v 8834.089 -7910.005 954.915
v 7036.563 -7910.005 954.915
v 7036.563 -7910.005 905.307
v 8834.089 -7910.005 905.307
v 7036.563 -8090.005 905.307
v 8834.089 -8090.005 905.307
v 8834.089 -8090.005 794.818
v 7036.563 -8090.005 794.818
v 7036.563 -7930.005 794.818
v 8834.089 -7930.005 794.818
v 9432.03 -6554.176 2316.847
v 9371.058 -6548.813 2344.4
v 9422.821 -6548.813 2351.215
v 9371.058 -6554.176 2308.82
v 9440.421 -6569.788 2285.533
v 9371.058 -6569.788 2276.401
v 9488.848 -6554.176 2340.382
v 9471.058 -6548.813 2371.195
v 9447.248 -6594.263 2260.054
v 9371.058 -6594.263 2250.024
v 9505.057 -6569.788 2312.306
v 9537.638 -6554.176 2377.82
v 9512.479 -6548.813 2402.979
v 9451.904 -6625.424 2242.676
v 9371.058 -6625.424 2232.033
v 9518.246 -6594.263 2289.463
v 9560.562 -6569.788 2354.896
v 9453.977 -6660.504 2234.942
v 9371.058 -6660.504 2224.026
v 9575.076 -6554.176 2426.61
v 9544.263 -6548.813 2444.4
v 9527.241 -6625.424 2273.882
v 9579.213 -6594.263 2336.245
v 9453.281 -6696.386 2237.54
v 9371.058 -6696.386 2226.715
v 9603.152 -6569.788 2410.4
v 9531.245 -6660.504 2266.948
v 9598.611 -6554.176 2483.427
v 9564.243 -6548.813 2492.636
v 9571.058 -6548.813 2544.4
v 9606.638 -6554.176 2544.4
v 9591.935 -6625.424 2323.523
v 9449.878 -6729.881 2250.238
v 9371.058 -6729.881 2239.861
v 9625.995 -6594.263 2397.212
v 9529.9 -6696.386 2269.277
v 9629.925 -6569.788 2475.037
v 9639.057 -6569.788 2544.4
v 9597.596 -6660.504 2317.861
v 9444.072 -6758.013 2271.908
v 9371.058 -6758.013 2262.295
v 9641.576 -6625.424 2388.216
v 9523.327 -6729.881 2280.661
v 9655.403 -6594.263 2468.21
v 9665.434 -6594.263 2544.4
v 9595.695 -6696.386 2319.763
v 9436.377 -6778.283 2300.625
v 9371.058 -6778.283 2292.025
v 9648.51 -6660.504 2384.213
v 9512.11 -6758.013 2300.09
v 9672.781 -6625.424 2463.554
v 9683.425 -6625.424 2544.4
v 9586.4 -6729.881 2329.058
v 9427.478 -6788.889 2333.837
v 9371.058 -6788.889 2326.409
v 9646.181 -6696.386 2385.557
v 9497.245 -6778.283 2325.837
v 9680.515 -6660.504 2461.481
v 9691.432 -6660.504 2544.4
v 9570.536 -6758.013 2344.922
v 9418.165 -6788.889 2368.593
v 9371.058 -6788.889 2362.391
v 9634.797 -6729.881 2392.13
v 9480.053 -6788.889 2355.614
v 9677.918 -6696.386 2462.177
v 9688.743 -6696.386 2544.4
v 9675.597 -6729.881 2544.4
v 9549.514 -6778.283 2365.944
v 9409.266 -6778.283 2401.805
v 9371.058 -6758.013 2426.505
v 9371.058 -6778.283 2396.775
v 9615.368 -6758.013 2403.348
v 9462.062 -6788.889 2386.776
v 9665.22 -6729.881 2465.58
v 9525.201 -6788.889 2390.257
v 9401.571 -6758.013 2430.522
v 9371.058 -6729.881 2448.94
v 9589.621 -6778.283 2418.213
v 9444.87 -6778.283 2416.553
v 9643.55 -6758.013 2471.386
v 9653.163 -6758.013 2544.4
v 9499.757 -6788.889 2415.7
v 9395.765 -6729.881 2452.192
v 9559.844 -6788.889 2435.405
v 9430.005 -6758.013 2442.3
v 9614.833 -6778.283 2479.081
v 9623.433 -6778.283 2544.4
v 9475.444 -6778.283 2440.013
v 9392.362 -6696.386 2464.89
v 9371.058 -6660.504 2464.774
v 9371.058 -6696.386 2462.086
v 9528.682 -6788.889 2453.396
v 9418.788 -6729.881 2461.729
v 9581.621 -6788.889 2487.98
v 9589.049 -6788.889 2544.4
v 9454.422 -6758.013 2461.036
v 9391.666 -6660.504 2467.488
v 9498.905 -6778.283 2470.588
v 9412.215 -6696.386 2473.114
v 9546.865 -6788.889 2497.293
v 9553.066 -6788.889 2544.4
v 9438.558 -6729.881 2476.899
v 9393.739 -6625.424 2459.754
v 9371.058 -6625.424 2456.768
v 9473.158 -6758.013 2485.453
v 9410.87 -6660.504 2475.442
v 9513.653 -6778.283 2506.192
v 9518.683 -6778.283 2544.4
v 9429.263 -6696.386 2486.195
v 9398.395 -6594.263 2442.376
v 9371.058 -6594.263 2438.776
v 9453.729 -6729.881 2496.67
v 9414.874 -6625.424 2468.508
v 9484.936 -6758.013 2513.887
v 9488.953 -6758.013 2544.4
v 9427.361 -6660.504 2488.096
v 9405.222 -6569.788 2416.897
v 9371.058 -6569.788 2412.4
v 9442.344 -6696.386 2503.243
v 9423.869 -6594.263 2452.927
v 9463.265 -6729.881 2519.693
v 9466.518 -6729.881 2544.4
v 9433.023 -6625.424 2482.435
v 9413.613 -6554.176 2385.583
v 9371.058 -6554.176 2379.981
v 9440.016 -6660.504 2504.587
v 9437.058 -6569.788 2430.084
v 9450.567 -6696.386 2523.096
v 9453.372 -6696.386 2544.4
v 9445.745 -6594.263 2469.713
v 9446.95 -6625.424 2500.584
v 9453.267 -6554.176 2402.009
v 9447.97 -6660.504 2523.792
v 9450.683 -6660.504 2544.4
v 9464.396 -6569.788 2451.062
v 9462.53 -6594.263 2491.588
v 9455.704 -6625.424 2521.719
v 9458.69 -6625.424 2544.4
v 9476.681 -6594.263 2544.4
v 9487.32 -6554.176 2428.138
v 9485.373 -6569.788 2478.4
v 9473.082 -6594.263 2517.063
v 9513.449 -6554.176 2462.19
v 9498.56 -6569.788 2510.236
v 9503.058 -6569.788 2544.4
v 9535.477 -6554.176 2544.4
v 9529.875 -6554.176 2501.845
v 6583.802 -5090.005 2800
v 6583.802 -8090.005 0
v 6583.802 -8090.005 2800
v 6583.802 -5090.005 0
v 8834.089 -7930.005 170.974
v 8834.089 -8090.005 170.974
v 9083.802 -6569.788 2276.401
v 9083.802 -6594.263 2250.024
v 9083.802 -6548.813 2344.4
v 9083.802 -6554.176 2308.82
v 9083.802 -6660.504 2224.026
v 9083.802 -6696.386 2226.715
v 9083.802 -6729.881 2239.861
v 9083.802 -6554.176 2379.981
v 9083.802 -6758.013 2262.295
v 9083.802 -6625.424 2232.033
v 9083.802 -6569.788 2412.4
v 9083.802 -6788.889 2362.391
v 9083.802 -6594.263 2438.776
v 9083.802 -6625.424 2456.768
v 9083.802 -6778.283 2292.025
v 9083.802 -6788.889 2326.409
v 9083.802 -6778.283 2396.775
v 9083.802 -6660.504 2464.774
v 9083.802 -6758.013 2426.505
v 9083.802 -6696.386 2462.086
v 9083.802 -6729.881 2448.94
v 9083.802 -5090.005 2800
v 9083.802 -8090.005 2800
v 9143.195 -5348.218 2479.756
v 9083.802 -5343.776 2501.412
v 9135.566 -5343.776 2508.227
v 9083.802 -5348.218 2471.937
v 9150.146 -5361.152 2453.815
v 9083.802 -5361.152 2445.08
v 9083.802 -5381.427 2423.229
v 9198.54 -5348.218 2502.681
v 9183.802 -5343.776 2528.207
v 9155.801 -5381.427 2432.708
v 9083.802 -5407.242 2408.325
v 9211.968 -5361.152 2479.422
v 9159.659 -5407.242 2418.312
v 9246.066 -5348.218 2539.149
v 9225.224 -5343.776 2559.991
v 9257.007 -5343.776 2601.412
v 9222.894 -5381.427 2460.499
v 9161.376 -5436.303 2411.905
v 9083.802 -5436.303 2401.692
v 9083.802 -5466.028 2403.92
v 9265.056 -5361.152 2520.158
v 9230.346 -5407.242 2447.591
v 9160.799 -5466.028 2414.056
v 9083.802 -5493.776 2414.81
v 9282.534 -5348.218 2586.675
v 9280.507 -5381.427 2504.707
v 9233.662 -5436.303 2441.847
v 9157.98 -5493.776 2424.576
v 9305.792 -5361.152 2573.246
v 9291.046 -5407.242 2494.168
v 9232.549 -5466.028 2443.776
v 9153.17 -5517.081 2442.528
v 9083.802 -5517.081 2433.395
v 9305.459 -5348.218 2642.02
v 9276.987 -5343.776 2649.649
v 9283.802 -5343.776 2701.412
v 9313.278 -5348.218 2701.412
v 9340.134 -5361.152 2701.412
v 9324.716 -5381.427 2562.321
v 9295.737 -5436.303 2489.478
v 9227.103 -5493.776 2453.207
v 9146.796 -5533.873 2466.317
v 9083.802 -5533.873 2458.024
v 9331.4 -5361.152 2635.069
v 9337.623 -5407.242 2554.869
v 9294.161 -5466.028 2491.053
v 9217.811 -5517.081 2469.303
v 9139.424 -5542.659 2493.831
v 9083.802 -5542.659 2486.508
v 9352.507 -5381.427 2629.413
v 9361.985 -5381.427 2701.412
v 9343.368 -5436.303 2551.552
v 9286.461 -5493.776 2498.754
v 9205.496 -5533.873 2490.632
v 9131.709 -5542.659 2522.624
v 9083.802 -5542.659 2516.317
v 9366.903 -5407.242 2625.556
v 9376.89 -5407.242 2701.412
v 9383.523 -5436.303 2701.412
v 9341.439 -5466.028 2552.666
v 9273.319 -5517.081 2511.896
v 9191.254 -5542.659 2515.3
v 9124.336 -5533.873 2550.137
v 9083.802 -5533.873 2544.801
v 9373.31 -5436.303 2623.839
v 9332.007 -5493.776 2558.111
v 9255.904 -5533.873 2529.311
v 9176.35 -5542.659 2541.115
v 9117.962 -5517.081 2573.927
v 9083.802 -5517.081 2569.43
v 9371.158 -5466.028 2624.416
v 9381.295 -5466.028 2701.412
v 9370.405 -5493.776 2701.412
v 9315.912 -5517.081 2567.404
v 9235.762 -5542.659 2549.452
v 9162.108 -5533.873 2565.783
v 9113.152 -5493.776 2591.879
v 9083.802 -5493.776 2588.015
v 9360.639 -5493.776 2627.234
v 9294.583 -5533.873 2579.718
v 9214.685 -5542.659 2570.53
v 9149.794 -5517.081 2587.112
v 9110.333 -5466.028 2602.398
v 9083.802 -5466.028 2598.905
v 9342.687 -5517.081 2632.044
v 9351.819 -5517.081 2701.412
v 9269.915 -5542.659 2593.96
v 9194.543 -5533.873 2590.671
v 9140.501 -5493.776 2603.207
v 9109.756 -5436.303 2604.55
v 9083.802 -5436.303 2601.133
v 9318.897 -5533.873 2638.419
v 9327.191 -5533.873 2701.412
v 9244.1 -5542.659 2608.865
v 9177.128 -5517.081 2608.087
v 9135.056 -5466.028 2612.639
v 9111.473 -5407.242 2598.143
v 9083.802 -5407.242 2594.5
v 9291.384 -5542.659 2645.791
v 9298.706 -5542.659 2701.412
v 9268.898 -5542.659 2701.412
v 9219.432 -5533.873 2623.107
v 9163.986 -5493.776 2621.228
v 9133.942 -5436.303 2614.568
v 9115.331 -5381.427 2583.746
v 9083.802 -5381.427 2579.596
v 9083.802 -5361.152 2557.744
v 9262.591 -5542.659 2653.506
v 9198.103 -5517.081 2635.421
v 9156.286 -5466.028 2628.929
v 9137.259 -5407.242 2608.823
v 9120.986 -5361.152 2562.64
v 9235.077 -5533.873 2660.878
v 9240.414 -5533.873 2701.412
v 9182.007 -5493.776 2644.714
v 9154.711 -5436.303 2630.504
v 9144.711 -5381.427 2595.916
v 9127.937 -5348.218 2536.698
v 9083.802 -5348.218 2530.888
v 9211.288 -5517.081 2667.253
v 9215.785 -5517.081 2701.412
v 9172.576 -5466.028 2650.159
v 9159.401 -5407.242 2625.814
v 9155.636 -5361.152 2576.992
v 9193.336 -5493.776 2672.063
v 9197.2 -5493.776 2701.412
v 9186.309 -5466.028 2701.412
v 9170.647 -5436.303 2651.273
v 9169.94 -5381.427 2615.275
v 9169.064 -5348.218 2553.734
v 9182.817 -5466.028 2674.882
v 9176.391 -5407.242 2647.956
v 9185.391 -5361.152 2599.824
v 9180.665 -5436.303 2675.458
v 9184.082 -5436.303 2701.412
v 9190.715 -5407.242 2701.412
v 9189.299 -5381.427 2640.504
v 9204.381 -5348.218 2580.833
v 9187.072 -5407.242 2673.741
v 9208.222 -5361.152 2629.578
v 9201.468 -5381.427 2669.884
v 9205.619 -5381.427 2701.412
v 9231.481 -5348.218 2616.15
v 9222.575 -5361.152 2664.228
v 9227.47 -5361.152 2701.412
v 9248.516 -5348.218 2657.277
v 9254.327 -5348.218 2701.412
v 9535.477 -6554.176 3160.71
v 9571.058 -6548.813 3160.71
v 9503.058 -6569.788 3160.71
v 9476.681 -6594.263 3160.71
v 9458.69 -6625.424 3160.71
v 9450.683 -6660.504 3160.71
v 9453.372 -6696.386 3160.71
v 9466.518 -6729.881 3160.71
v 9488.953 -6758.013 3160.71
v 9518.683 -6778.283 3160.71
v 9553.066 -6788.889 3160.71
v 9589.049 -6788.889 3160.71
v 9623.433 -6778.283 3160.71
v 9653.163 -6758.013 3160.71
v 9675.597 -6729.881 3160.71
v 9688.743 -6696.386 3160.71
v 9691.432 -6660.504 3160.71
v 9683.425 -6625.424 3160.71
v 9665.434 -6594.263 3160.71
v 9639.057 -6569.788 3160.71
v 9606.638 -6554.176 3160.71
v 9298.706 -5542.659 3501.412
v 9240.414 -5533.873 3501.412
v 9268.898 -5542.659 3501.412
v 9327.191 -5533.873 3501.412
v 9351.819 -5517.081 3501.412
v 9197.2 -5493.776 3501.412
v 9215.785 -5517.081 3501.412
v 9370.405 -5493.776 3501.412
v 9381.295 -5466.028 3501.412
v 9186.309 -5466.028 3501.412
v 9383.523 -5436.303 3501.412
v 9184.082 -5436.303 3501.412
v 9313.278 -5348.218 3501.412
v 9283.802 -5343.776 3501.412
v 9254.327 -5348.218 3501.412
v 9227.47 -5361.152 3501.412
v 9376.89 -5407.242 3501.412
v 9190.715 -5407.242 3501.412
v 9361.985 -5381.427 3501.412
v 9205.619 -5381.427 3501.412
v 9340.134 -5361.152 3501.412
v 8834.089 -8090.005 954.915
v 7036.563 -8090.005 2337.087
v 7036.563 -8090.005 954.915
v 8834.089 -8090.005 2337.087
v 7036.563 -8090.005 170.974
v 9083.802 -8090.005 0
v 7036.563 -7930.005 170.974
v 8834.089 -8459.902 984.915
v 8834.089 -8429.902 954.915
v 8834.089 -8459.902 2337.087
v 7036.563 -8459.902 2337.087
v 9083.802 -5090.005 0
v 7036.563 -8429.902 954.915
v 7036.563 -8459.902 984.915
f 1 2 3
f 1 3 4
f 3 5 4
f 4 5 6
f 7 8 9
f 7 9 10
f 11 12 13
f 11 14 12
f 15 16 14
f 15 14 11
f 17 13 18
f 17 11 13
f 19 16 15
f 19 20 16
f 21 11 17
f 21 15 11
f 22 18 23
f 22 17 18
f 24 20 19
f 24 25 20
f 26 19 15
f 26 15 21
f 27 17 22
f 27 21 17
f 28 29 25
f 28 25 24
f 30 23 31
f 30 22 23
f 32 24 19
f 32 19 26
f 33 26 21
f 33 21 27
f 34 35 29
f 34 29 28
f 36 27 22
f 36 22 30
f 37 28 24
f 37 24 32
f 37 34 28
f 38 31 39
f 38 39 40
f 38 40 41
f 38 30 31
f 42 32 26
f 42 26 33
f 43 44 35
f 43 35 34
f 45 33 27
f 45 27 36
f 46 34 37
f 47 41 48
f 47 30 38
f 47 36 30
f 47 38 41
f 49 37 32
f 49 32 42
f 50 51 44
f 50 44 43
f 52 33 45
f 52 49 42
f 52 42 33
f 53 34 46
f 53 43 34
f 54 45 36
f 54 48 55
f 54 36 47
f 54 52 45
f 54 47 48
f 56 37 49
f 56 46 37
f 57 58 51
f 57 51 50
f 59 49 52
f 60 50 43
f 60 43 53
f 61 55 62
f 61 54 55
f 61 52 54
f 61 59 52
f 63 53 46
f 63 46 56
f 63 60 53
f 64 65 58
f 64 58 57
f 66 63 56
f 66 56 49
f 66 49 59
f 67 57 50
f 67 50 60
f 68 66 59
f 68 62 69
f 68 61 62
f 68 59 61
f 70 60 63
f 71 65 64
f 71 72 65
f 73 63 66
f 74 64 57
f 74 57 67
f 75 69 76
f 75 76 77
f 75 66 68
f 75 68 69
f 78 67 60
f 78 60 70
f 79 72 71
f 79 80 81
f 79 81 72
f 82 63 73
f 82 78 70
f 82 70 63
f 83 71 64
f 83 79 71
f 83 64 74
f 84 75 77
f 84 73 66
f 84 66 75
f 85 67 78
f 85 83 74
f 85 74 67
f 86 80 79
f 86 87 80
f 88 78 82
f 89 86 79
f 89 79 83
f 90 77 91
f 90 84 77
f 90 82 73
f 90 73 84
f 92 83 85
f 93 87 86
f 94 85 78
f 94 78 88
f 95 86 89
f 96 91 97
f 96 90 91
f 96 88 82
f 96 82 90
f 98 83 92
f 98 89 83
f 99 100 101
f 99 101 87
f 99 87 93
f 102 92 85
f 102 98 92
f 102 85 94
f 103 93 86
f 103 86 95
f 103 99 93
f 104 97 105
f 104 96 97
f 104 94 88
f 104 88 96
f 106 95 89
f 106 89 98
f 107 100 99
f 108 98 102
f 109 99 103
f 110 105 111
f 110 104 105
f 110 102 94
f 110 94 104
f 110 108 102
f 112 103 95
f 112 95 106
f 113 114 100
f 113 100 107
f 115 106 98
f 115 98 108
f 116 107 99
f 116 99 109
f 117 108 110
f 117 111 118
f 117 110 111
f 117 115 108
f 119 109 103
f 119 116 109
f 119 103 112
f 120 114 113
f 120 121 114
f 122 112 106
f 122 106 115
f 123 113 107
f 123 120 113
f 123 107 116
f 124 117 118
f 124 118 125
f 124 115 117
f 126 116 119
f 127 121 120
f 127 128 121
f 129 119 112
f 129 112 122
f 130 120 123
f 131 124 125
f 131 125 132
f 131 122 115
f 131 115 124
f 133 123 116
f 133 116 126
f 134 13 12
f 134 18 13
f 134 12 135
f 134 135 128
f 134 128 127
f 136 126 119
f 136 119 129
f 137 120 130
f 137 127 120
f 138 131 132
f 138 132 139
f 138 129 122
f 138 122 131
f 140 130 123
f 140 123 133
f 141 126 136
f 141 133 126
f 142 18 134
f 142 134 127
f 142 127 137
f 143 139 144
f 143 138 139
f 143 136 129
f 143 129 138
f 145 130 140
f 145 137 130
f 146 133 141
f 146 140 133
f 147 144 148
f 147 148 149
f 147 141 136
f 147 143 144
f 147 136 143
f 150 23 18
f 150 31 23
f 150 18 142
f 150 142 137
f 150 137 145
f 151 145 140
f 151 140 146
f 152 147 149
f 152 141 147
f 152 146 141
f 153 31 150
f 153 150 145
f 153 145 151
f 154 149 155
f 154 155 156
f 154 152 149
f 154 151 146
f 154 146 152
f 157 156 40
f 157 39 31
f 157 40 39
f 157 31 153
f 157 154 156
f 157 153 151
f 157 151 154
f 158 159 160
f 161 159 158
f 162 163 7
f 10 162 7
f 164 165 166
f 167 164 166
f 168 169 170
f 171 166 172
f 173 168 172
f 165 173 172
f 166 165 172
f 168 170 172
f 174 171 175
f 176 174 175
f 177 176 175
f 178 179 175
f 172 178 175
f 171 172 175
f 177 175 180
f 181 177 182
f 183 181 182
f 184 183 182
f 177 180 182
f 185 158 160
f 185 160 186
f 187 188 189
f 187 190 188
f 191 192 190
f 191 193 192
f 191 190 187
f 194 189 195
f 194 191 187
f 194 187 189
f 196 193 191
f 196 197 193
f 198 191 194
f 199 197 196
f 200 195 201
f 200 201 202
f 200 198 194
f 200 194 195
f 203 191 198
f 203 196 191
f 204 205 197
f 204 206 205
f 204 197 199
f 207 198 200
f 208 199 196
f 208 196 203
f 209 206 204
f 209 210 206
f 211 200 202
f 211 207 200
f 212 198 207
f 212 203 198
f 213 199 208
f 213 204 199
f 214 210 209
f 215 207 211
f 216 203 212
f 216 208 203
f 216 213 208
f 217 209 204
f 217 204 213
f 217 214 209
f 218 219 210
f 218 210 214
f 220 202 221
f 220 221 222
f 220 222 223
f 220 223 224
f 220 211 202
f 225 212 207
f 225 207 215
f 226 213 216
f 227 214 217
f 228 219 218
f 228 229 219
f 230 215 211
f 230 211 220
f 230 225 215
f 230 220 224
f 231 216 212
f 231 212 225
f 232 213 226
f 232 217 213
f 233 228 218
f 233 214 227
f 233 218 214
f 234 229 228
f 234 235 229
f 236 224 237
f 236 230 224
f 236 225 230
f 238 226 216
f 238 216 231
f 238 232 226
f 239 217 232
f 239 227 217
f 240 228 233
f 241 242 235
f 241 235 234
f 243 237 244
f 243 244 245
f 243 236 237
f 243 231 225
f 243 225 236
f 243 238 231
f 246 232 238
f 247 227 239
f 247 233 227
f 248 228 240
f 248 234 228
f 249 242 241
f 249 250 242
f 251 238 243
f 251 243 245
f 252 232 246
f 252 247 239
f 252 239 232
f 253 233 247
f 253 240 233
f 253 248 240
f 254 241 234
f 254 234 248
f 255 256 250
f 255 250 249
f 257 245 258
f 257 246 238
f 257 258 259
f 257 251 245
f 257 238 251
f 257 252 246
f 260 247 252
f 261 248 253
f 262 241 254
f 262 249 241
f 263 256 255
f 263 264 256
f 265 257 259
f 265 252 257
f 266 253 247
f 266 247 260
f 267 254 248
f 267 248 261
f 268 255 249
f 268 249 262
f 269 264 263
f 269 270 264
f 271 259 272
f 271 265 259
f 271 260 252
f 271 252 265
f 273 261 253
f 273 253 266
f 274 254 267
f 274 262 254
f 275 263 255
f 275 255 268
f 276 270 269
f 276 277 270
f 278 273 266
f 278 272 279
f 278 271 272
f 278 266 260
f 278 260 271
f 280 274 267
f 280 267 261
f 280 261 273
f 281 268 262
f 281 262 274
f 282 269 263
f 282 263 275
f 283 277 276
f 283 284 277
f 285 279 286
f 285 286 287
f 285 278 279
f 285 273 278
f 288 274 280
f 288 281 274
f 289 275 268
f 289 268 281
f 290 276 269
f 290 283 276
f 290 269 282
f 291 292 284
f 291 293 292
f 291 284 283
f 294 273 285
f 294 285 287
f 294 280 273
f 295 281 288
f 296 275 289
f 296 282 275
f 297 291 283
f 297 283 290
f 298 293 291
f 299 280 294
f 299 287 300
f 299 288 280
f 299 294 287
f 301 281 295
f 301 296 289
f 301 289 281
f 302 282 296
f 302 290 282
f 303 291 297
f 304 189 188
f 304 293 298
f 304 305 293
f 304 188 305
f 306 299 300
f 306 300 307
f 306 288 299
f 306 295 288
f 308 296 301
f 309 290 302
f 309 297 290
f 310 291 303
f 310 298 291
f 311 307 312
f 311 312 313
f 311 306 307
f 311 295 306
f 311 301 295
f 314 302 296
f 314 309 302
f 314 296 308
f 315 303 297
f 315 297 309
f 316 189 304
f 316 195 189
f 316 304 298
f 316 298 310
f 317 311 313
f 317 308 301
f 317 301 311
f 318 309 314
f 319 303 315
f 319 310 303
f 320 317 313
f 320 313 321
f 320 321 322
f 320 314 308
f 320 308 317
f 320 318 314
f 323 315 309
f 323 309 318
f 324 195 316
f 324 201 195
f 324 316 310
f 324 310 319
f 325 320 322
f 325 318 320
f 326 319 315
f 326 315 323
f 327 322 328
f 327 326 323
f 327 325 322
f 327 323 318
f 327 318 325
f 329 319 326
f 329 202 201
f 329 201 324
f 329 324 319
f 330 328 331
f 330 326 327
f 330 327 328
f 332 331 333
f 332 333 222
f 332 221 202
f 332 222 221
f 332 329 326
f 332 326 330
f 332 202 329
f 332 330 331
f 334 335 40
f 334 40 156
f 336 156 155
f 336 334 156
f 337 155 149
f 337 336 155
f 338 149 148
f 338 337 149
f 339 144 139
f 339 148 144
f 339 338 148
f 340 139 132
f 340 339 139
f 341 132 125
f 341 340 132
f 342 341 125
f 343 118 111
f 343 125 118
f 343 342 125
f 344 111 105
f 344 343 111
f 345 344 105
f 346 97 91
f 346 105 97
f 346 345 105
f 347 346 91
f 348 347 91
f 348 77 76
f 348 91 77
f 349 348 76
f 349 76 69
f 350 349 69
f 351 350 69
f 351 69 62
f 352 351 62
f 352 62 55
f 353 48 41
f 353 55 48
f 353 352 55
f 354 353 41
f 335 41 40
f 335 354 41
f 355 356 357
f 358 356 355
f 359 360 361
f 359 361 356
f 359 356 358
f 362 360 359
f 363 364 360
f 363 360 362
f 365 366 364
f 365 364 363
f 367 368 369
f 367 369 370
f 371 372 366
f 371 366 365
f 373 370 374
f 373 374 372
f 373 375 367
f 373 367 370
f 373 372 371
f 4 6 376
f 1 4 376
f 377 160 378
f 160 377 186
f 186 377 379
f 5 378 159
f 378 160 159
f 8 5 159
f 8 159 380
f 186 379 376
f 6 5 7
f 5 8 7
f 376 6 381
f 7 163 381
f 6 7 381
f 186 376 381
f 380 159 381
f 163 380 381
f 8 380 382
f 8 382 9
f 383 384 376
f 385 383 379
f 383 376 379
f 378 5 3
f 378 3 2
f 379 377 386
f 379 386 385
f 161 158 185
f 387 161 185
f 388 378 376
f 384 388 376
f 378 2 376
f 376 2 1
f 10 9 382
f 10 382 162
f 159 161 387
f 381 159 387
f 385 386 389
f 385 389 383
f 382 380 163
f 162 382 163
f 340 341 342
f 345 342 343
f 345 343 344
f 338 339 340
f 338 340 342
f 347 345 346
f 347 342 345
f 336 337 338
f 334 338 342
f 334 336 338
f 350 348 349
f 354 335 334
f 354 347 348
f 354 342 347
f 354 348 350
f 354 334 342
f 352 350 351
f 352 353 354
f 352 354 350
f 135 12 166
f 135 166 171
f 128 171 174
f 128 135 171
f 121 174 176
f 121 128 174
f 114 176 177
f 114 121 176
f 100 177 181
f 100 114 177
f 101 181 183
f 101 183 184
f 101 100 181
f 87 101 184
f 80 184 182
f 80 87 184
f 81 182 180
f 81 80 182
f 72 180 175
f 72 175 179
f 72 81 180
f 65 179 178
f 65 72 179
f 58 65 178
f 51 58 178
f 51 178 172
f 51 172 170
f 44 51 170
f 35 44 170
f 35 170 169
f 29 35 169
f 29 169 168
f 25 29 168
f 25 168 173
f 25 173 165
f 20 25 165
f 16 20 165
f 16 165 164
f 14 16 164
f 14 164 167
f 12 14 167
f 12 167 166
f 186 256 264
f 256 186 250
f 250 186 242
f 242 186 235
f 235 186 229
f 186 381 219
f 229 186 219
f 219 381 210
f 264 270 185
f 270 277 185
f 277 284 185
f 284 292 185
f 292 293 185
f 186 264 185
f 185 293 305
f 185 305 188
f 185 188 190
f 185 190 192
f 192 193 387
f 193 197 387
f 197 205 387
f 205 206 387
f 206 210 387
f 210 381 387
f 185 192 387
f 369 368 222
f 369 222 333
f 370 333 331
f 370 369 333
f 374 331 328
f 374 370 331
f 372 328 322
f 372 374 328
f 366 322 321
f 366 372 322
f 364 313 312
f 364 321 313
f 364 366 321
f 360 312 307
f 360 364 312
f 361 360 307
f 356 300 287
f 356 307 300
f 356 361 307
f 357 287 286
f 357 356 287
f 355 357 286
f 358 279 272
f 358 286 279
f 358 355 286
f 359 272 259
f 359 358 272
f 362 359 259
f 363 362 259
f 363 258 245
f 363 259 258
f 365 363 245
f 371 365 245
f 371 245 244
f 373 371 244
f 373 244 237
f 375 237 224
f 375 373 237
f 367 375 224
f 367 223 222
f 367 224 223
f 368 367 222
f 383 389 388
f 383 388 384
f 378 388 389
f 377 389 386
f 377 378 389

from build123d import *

# Parameters (mm, degrees)
F0_W     = 2500
F0_H     = 3000
F1_DEPTH = 2800
F2_W     = 1797.5258827209
F2_H     = 1382.1721076965
F3_DEPTH = 369.89699
F4_W     = 1797.5258827209
F4_H     = 49.607694149
F5_DEPTH = 180
F6_W     = 1797.5258827209
F6_H     = 623.8443106413
F7_DEPTH = 160
F8_R     = 100
F12_SIZE = 30
F13_R    = 120.7118368122


with BuildPart() as f1:
    # F0 (on Top) → F1 (new body)
    with BuildSketch(Plane.XY):
        with Locations((7833.8022232056, -6590.0049209595)):
            Rectangle(F0_W, F0_H)
    extrude(amount=F1_DEPTH)

    # F2 (on face) → F3 (join)
    with BuildSketch(Plane.XZ.offset(8090.0049209595)):
        with Locations((7935.3263378143, 1646.0011005402)):
            Rectangle(F2_W, F2_H)
    extrude(amount=F3_DEPTH)

    # F4 (on face) → F5 (cut)
    with BuildSketch(Plane.XZ.offset(8090.0049209595)):
        with Locations((7935.3263378143, 930.1111996174)):
            Rectangle(F4_W, F4_H)
    extrude(amount=-F5_DEPTH, mode=Mode.SUBTRACT)

    # F6 (on face) → F7 (cut)
    with BuildSketch(Plane.XZ.offset(8090.0049209595)):
        with Locations((7935.3263378143, 482.8957691789)):
            Rectangle(F6_W, F6_H)
    extrude(amount=-F7_DEPTH, mode=Mode.SUBTRACT)

    # F11: sweep along a path in F10
    with BuildLine(Plane.XZ.offset(5443.7756538391)) as f11_path:
        ThreePointArc((9083.8022232056, 2501.4123916626), (9225.2235794429, 2559.9910354253), (9283.8022232056, 2701.4123916626))
        Line((9283.8022232056, 2701.4123916626), (9283.8022232056, 3501.4123916626))
    # F8 (on face) → F11 (sweep)
    with BuildSketch(Plane.YZ.offset(9083.8022232056)):
        with Locations((-5443.7756538391, 2501.4123916626)):
            Circle(F8_R)
    sweep(path=f11_path.line)

    # F12
    f12_edges = [f1.edges().sort_by_distance(p)[0] for p in [
        (7935.326338, -8459.901911, 954.915047),
    ]]
    chamfer(f12_edges, length=F12_SIZE)


with BuildPart() as f16:
    # F16: sweep along a path in F15
    with BuildLine(Plane.XZ.offset(6669.5251464844)) as f16_path:
        Line((9083.8022232056, 2344.4001674652), (9371.0576248169, 2344.4001674652))
        ThreePointArc((9371.0576248169, 2344.4001674652), (9512.4789810542, 2402.9788112279), (9571.0576248169, 2544.4001674652))
        Line((9571.0576248169, 2544.4001674652), (9571.0576248169, 3160.710401535))
    # F13 (on face) → F16 (sweep)
    with BuildSketch(Plane.YZ.offset(9083.8022232056)):
        with Locations((-6669.5251464844, 2344.4001674652)):
            Circle(F13_R)
    sweep(path=f16_path.line)


solid = Compound([f1.part, f16.part])
